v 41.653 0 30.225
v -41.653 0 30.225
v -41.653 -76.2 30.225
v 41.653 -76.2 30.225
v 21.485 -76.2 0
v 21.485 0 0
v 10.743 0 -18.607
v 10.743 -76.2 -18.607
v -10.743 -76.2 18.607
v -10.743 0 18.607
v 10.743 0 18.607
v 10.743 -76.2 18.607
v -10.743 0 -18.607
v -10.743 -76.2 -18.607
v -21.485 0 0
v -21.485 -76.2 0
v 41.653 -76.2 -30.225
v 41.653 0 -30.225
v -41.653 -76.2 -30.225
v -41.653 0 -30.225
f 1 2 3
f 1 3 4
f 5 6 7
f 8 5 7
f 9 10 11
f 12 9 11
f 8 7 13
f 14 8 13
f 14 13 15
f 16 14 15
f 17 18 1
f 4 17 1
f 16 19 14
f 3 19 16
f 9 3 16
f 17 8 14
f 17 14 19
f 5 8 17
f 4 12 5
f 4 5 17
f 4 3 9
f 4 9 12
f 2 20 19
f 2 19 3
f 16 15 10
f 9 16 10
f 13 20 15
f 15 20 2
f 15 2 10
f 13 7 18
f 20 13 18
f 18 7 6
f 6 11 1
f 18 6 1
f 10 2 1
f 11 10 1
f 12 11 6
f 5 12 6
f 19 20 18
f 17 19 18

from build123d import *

# Parameters (mm, degrees)
F0_W     = 83.305214
F0_H     = 60.44998
F1_DEPTH = 76.2


with BuildPart() as f1:
    # F0 (on Front) → F1 (new body)
    with BuildSketch(Plane.XZ):
        Rectangle(F0_W, F0_H)
        Polygon((10.742642, 18.606802), (21.485284, 0), (10.742642, -18.606802), (-10.742642, -18.606802), (-21.485284, 0), (-10.742642, 18.606802), align=None, mode=Mode.SUBTRACT)
    extrude(amount=F1_DEPTH)


solid = f1.part
